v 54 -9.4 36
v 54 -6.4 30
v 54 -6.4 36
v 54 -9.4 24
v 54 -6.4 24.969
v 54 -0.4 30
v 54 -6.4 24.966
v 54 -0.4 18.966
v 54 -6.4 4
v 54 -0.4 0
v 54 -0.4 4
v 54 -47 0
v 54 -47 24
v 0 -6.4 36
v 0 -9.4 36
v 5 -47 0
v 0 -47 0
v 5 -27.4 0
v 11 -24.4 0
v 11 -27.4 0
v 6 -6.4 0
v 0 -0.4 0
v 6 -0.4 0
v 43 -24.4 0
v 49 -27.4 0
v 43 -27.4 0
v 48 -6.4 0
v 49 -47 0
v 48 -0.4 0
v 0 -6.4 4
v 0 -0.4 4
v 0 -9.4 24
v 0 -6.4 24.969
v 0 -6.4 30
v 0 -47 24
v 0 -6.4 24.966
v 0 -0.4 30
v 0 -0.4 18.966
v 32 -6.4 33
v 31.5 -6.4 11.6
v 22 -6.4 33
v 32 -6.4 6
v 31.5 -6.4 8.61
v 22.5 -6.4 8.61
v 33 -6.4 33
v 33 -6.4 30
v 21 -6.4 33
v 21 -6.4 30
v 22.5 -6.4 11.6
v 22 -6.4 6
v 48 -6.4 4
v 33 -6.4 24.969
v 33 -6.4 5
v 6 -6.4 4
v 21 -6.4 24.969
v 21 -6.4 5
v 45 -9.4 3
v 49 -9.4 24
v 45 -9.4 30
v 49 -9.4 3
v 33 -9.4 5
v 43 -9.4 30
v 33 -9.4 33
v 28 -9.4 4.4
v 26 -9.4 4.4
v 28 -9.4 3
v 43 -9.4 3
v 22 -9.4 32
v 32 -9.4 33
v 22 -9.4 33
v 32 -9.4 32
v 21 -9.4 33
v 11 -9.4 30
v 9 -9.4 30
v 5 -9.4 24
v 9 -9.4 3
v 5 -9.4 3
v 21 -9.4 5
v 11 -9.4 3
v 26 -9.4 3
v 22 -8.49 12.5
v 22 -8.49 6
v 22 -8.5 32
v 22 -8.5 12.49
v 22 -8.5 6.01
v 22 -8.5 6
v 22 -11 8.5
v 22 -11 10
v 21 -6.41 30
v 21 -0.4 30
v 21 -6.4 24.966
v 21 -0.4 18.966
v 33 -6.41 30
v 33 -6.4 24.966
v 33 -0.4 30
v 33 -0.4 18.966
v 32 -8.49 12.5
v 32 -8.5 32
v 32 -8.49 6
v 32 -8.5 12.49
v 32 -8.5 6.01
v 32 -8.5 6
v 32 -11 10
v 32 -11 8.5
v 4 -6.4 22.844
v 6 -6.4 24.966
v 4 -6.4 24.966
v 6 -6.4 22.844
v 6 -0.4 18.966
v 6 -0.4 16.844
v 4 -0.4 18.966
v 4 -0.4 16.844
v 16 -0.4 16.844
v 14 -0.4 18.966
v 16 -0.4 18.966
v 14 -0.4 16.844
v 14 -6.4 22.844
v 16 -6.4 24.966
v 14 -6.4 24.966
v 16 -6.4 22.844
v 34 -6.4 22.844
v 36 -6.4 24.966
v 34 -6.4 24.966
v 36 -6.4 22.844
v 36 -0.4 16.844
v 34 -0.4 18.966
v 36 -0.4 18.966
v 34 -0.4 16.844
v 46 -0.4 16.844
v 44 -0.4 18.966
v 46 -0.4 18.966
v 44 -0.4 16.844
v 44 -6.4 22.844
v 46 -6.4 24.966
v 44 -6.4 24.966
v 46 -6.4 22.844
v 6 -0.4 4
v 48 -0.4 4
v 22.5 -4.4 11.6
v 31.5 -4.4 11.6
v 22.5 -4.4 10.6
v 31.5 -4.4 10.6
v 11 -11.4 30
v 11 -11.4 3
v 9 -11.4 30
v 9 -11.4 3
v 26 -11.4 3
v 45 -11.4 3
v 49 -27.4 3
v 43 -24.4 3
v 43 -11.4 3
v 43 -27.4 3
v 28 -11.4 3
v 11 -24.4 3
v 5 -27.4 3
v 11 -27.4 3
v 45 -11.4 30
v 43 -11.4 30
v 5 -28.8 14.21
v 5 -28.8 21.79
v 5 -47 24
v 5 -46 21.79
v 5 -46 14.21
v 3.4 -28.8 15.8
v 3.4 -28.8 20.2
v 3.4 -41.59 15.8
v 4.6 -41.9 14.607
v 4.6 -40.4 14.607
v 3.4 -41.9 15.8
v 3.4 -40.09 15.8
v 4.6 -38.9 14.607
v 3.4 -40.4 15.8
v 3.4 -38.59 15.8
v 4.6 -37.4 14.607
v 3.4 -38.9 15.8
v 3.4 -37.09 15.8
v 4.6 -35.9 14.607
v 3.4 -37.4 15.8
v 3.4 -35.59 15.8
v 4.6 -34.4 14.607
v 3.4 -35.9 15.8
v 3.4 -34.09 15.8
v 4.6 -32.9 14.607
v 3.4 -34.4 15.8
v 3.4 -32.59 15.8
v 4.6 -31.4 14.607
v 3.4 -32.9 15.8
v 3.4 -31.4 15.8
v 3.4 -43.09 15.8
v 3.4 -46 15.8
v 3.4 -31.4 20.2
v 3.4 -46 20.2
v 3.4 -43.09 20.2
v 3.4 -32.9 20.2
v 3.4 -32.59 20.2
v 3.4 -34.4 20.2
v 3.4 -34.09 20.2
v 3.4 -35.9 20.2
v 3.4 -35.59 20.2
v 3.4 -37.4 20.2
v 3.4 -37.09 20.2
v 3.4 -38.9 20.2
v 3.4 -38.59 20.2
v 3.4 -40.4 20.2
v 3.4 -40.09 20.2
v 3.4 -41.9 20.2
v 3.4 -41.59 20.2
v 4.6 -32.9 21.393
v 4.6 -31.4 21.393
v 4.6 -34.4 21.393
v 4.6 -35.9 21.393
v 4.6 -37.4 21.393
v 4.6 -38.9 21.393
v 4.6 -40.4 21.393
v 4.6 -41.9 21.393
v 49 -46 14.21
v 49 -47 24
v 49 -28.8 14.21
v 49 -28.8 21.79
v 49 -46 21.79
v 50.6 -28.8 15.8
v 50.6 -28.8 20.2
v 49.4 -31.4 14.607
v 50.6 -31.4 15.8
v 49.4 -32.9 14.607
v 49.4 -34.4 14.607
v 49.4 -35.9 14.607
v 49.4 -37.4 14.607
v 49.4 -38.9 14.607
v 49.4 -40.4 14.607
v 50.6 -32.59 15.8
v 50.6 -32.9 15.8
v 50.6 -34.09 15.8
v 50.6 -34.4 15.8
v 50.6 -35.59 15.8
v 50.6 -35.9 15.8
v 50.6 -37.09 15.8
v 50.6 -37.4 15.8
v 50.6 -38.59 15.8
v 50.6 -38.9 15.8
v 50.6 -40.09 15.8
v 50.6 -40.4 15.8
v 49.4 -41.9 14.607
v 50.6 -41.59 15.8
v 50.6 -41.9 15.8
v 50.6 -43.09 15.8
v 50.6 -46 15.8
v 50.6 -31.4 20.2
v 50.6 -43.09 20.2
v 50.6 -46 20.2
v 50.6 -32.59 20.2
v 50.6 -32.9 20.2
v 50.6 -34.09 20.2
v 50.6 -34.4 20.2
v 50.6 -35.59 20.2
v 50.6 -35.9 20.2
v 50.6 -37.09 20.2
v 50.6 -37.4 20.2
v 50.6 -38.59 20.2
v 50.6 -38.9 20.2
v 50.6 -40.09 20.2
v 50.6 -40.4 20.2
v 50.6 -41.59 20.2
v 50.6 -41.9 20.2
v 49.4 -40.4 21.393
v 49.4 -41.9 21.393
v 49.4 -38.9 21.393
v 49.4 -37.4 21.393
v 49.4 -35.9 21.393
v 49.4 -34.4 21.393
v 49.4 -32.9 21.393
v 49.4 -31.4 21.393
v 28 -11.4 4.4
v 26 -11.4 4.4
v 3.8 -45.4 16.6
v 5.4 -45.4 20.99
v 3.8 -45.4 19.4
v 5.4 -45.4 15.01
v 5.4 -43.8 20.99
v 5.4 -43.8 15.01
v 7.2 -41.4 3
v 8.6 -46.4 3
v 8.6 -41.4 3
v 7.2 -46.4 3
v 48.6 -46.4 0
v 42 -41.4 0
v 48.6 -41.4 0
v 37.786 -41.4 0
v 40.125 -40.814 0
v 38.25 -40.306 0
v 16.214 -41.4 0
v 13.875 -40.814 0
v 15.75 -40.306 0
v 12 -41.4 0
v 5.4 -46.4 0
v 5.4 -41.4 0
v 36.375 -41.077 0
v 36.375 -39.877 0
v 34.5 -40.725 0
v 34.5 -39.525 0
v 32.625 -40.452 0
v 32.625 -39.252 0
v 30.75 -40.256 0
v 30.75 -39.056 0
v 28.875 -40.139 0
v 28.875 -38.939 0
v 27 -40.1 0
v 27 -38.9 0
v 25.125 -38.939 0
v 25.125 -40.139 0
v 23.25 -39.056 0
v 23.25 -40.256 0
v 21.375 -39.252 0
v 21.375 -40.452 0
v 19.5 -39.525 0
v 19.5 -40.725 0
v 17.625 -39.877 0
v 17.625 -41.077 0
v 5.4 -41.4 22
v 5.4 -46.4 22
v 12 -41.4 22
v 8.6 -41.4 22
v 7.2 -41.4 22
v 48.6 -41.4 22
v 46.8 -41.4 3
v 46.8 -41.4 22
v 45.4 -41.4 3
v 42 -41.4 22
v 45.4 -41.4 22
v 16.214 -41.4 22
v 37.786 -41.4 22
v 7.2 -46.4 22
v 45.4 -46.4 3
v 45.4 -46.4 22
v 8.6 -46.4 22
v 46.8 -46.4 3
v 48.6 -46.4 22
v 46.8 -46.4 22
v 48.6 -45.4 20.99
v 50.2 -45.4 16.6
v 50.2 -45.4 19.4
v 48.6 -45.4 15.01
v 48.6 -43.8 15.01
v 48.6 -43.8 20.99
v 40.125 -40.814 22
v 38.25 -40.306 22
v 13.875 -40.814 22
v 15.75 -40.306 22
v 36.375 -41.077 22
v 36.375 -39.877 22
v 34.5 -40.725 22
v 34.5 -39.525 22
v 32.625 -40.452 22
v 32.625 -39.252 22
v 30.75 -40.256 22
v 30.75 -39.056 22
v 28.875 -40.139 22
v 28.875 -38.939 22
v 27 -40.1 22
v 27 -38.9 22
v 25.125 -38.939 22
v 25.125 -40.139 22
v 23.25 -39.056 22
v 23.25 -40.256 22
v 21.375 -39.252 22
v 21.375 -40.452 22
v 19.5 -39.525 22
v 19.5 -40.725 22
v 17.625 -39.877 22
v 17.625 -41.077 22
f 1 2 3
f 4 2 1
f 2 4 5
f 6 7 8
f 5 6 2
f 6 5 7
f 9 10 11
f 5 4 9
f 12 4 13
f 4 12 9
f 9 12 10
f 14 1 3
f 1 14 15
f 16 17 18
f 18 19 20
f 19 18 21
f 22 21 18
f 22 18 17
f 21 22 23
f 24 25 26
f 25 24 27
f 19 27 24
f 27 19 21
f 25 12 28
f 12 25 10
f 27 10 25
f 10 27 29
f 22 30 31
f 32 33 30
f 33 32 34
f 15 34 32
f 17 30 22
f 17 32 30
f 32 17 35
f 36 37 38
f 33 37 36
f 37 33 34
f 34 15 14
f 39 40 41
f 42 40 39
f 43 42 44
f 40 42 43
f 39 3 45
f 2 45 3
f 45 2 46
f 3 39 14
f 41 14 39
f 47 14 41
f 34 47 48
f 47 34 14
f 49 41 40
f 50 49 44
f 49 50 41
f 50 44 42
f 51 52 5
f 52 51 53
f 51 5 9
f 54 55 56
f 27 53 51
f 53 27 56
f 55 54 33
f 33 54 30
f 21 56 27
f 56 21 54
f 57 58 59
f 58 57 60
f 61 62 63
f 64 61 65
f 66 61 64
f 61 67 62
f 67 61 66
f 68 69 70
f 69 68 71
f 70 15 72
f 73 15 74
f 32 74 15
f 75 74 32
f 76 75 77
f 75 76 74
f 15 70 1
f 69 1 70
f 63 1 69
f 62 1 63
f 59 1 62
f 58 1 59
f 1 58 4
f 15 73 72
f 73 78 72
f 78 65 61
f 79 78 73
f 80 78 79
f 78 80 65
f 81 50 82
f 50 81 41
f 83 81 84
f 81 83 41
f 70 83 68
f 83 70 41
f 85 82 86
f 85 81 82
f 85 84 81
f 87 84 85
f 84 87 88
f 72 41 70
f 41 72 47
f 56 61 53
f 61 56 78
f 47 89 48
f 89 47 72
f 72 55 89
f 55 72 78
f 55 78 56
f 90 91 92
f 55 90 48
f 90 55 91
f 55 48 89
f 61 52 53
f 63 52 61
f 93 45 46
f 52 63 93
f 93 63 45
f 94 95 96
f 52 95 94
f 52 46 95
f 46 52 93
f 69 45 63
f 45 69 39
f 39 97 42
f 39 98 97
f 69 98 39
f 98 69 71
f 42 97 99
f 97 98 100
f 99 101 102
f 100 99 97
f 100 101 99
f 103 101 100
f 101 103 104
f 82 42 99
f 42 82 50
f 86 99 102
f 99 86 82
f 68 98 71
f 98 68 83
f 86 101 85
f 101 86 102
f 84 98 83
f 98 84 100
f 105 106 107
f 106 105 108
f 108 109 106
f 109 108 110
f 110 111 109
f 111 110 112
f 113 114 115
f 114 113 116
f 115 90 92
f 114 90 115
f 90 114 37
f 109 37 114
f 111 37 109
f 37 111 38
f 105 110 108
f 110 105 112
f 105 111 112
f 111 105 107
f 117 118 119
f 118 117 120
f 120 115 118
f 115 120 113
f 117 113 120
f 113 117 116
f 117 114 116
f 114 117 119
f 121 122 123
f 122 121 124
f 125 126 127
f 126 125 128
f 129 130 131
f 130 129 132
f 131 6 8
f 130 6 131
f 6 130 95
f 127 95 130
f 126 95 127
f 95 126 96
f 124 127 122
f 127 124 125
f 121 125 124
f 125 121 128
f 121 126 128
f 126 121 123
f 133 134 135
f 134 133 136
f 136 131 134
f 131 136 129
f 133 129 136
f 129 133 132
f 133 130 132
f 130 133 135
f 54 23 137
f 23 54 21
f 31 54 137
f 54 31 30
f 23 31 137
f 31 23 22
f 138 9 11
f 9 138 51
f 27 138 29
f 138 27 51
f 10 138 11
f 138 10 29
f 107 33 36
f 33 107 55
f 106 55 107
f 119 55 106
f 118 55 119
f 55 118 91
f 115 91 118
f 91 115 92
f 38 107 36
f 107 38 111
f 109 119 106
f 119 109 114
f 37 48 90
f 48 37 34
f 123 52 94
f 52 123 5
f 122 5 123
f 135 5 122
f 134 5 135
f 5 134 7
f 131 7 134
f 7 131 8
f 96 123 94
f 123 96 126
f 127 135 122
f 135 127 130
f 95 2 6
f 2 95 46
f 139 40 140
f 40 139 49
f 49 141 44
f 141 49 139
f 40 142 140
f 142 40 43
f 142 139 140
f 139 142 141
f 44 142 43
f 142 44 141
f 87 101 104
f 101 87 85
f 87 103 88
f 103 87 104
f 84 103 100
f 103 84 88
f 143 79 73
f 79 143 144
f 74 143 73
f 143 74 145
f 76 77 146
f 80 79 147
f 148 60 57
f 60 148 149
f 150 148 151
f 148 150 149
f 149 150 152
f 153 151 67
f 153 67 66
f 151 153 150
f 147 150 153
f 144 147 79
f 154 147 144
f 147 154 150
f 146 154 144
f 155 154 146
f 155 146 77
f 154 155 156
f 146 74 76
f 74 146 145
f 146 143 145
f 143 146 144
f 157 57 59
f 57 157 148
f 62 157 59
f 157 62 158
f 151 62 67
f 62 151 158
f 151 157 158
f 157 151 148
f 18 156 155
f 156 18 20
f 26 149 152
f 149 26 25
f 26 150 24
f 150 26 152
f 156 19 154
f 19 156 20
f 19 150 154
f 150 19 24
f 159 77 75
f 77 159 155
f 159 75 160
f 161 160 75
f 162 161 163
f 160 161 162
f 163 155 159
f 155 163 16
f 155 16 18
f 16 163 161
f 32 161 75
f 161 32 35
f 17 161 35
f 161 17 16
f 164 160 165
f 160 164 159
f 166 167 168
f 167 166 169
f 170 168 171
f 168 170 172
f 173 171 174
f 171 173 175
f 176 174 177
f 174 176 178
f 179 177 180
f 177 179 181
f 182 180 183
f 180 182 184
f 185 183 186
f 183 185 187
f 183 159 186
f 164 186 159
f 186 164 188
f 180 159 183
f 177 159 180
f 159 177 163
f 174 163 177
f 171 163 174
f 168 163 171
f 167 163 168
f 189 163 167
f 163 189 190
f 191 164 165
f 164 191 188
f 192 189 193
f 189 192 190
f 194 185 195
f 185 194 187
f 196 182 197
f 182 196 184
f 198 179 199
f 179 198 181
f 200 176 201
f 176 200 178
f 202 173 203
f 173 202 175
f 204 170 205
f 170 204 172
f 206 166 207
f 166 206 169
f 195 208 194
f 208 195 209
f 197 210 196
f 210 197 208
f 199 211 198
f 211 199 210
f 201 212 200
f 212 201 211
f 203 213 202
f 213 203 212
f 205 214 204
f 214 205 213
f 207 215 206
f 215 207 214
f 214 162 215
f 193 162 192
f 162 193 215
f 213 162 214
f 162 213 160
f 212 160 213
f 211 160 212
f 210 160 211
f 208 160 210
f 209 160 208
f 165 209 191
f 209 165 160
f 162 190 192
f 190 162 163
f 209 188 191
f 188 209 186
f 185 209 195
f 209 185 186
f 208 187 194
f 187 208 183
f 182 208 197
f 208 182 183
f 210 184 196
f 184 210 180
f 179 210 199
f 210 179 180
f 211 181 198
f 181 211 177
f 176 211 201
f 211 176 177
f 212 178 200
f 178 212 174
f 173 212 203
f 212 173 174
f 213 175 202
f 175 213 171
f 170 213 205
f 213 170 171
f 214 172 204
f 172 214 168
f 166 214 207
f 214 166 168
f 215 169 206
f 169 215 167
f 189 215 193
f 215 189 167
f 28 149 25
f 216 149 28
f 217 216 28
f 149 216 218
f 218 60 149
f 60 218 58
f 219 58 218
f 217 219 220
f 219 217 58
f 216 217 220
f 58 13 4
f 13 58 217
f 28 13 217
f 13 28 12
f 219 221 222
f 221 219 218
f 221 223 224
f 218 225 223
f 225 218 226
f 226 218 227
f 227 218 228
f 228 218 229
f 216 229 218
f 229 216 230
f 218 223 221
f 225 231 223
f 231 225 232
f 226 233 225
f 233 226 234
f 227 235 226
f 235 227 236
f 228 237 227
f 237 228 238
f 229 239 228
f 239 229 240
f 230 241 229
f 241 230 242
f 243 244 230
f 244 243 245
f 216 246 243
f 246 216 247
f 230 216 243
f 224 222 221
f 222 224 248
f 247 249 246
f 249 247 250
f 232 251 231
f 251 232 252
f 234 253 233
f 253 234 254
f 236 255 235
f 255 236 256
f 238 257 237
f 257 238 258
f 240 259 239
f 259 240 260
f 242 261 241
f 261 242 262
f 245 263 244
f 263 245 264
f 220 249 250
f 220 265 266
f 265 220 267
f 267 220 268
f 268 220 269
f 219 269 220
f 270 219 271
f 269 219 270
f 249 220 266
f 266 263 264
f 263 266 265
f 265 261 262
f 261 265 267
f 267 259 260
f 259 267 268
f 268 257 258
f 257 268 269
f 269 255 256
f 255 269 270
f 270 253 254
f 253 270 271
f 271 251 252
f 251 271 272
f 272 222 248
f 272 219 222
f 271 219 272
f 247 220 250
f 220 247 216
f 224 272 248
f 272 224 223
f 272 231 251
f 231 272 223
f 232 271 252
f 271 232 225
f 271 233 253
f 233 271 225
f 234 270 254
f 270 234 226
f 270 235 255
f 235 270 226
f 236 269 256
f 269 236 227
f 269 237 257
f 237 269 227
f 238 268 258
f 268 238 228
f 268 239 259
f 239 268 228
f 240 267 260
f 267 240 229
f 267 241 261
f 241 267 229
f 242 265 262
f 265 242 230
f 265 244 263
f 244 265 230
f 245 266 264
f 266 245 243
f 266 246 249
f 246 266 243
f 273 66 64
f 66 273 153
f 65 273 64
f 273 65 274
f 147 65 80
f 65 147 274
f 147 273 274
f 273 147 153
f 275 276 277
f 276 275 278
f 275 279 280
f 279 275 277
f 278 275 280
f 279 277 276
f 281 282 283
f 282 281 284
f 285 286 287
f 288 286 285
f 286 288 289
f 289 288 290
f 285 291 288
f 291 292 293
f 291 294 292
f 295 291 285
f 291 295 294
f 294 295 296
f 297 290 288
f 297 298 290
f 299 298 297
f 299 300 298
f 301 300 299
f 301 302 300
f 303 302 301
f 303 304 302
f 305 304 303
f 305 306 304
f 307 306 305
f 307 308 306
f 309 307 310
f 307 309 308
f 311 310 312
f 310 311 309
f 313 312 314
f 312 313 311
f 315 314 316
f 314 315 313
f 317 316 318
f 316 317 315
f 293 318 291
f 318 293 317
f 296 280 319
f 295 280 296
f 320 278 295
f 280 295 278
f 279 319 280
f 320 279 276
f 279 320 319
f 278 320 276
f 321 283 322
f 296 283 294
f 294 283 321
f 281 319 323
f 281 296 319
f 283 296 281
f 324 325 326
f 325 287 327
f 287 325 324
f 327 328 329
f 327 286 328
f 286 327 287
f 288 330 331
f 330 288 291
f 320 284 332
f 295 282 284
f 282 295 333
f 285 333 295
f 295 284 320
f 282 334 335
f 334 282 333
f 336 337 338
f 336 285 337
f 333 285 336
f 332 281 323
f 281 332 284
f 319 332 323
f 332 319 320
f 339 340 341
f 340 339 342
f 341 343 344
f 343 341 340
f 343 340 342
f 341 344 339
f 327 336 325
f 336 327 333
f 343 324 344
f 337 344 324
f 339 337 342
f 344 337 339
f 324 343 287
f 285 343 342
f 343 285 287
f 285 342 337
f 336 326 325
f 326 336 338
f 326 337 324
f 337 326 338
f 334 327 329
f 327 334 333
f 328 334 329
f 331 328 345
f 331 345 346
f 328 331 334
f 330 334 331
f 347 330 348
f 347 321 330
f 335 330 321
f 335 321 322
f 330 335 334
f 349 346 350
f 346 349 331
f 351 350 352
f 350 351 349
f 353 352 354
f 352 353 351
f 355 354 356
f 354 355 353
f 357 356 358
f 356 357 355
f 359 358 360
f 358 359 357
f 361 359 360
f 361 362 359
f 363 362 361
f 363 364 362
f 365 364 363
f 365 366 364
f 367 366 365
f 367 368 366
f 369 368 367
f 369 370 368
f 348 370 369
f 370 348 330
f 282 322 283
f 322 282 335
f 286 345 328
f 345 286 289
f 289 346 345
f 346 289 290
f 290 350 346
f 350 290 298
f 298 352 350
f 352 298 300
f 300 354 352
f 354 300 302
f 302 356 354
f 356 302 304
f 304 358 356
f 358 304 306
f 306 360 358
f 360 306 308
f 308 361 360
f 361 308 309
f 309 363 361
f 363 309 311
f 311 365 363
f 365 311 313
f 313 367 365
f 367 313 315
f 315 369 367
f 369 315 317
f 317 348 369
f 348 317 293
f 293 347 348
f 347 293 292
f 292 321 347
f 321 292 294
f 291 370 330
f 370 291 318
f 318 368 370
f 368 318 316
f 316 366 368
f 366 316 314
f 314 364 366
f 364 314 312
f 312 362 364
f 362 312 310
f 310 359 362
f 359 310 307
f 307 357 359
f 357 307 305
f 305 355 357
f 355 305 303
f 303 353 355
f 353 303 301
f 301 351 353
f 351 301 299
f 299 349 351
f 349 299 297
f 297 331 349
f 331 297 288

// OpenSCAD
// Interface carriers that hang on the chassis cleat strips: the strap bay (converters and
// relays) and the harness clamp; plus the printable dispatch for every control piece.
//
// Strap bay (one print, six copies): a box stands on the ledge against three back ribs. The
// print-in-place STRAP BAR rides between the two posts; a pawl finger at each end of the
// bar ratchets in a toothed groove along its post (1.5 mm steps), and a spring leaf on the
// bar takes up the step with 1.0-2.5 mm preload. Push the bar onto the box to clamp; to
// release, press both finger tops toward the middle (1.4 mm slot) and pull the bar away.
// Box capacity (DESIGN, parameters.scad): width along the panel <= 44, depth 15.5-30,
// height >= 18 up to each slot's capacity (lay_bays). Holding force, vibration retention
// and creep are NOT qualified.
//
// The harness clamp is the same bay without the ledge, 30 mm between posts, 7.5-30 mm stops:
// the bundle runs vertically between the posts and the bar presses it onto the back ribs.
//
// Print orientation: bays and the harness clamp print UPRIGHT as installed (plate bottom,
// ledge and strap bar on the bed, hook up). `carrier_part = "body"` renders each printable
// piece in its print pose, bed-zero.
include <cleat_carrier.scad>
use <compute_tower.scad>
use <chassis.scad>

// ---- Strap bay ---------------------------------------------------------------------------
function bay_W(w_in) = w_in + 2 * bay_post;
function bay_dk(d_max, k) = d_max - rt_pitch * k;
function bay_front_y(d_max) = bay_ref_y - (d_max + 3.5) - bay_bar_t - 0.6;
function bay_yf(d) = bay_ref_y - d - 4;        // pawl catch-face y with the bar at stop d
function bay_zt0() = -bay_drop + bay_tooth_z0;
// Leaf span: bay_leaf_span, or less where the crossbar is shorter (harness clamp).
function bay_leaf_span_for(w_in) =
    min(bay_leaf_span, bay_W(w_in) - 2 * (bay_post + 0.4 + rt_finger_t + bay_finger_slot) - 4);

module bay_groove_2d() {
    zt0 = bay_tooth_z0;   // relative to the ledge bottom, shifted by the caller
    th = bay_tooth_h;
    polygon([[bay_post + 0.01, zt0 - 0.8], [bay_post - bay_groove_d, zt0 + 0.8],
             [bay_post - bay_groove_d, zt0 + th - 0.8], [bay_post + 0.01, zt0 + th + 0.8]]);
}

module bay_post_left(W, d_max, steps) {
    z_lb = -bay_drop;
    front = bay_front_y(d_max);
    g0 = front + 1.0;
    g1 = bay_yf(bay_dk(d_max, steps)) + rt_tooth_out + 1.0;
    difference() {
        box3([0, front, z_lb], [bay_post, cr_plate_front + 0.01, z_lb + bay_post_h]);
        translate([0, 0, z_lb]) xz_prism(g0, g1) bay_groove_2d();
    }
    // Rack teeth inside the groove: catch faces at y_k face +y (toward the wall).
    intersection() {
        translate([0, 0, z_lb]) xz_prism(g0, g1) bay_groove_2d();
        translate([bay_post - bay_groove_d, 0, z_lb + bay_tooth_z0 - 1])
            linear_extrude(height = bay_tooth_h + 2)
                for (k = [0 : steps]) let(s = bay_yf(bay_dk(d_max, k)))
                    polygon([[-0.01, s - rt_h], [rt_h, s], [-0.01, s]]);
    }
}

module bay_frame(w_in = bay_w_in, d_max = bay_d_max, steps = bay_steps, ledge = true) {
    W = bay_W(w_in);
    z_lb = -bay_drop;
    g = cr_gap(0, W);
    d_min = bay_dk(d_max, steps);
    rib_z0 = z_lb + (ledge ? bay_ledge_t : 0);
    cr_hanger(0, W, z_lb);
    // Back ribs: two full-height side ribs, one centre rib under the latch tongue.
    for (x = [9, W - 11])
        box3([x, bay_ref_y, rib_z0], [x + 2, cr_plate_front + 0.01, cr_hook_top]);
    box3([W / 2 - 1, bay_ref_y, rib_z0],
         [W / 2 + 1, cr_plate_front + 0.01, cr_tongue_free - cr_tongue_slot - 0.6]);
    if (ledge) difference() {
        box3([bay_post - 0.01, bay_ref_y - d_min, z_lb],
             [W - bay_post + 0.01, cr_plate_front + 0.01, z_lb + bay_ledge_t]);
        // Recess under the bar's spring leaf at the closest stops.
        box3([W / 2 - bay_leaf_span_for(w_in) / 2 - 1, bay_ref_y - d_min - 1, z_lb - 1],
             [W / 2 + bay_leaf_span_for(w_in) / 2 + 1, bay_ref_y - d_min + bay_leaf + 0.5,
              z_lb + bay_ledge_t + 1]);
    }
    bay_post_left(W, d_max, steps);
    translate([W, 0, 0]) mirror([1, 0, 0]) bay_post_left(W, d_max, steps);
}

// The strap bar with its back face at distance d from the rib plane.
module bay_bar(w_in = bay_w_in, d = bay_d_max + 3.5) {
    W = bay_W(w_in);
    z_lb = -bay_drop;
    yb = bay_ref_y - d;
    xf0 = bay_post + 0.4;
    xf1 = xf0 + rt_finger_t;
    xs1 = xf1 + bay_finger_slot;
    zt0 = z_lb + bay_tooth_z0;
    yf = bay_yf(d);
    xc = W / 2;
    box3([xs1, yb - bay_bar_t, z_lb], [W - xs1, yb, z_lb + bay_bar_h]);
    for (m = [0, 1]) translate([m * W, 0, 0]) mirror([m, 0, 0]) {
        box3([xf0, yb - bay_bar_t, z_lb], [xs1 + 0.01, yb, z_lb + bay_finger_root]);
        box3([xf0, yb - bay_bar_t, z_lb], [xf1, yb, z_lb + bay_bar_h]);
        intersection() {
            translate([0, 0, zt0]) linear_extrude(height = bay_tooth_h)
                polygon([[xf0 + 0.01, yf], [xf0 - rt_tooth_out, yf], [xf0 + 0.01, yf + rt_tooth_out + 0.01]]);
            xz_prism(yf - 1, yf + rt_tooth_out + 1) polygon([
                [xf0 + 0.01, zt0], [xf0 - rt_tooth_out, zt0 + rt_tooth_out],
                [xf0 - rt_tooth_out, zt0 + bay_tooth_h - rt_tooth_out], [xf0 + 0.01, zt0 + bay_tooth_h]]);
        }
    }
    // Spring leaf: a 1.2 mm arc bulging bay_leaf toward the box, inside the crossbar's ends.
    span = bay_leaf_span_for(w_in);
    n = 16;
    outer = [for (i = [0 : n]) let(x = xc - span / 2 + span * i / n, t = 2 * (x - xc) / span)
                 [x, yb + bay_leaf * (1 - t * t)]];
    inner = [for (i = [n : -1 : 0]) [outer[i][0], outer[i][1] - bay_leaf_t]];
    translate([0, 0, z_lb]) linear_extrude(height = bay_bar_h)
        polygon(concat(outer, inner));
}

// Ratchet stop index that clamps a box of depth d (leaf compressed 1.0..2.5 mm).
function bay_stop_for(d, d_max, steps) =
    let(ks = [for (k = [0 : steps]) if (bay_dk(d_max, k) >= d) k]) ks[len(ks) - 1];

module strap_bay(part = "assembly", d = bay_d_max + 3.5) {
    if (part == "frame") bay_frame();
    else if (part == "bar") bay_bar(bay_w_in, d);
    else { bay_frame(); bay_bar(bay_w_in, d); }
}
module harness_clamp(part = "assembly", d = hc_d_max() + 3.5) {
    if (part == "frame") bay_frame(hc_w_in, hc_d_max(), hc_steps(), false);
    else if (part == "bar") bay_bar(hc_w_in, d);
    else { bay_frame(hc_w_in, hc_d_max(), hc_steps(), false); bay_bar(hc_w_in, d); }
}
function hc_d_max() = hc_bundle_d[1];
function hc_steps() = 15;

// ---- Printable dispatch ------------------------------------------------------------------
// carrier_kind: strap_bay | harness_clamp | chassis | chassis_base | tower_rack | tower_clamp
carrier_kind = "strap_bay";
carrier_part = "body";

module control_carrier_print(kind = carrier_kind) {
    if (kind == "strap_bay") translate([0, 0, bay_drop]) strap_bay("assembly");
    else if (kind == "harness_clamp") translate([0, 0, bay_drop]) harness_clamp("assembly");
    else if (kind == "chassis") chassis_print();
    else if (kind == "chassis_base") chassis_base_print();
    else if (kind == "tower_rack") tower_rack_print();
    else if (kind == "tower_clamp") tower_clamp_print();
    else assert(false, str("unknown carrier kind: ", kind));
}

if (carrier_part == "body") control_carrier_print(carrier_kind);
else assert(false, str("unknown carrier part: ", carrier_part));
